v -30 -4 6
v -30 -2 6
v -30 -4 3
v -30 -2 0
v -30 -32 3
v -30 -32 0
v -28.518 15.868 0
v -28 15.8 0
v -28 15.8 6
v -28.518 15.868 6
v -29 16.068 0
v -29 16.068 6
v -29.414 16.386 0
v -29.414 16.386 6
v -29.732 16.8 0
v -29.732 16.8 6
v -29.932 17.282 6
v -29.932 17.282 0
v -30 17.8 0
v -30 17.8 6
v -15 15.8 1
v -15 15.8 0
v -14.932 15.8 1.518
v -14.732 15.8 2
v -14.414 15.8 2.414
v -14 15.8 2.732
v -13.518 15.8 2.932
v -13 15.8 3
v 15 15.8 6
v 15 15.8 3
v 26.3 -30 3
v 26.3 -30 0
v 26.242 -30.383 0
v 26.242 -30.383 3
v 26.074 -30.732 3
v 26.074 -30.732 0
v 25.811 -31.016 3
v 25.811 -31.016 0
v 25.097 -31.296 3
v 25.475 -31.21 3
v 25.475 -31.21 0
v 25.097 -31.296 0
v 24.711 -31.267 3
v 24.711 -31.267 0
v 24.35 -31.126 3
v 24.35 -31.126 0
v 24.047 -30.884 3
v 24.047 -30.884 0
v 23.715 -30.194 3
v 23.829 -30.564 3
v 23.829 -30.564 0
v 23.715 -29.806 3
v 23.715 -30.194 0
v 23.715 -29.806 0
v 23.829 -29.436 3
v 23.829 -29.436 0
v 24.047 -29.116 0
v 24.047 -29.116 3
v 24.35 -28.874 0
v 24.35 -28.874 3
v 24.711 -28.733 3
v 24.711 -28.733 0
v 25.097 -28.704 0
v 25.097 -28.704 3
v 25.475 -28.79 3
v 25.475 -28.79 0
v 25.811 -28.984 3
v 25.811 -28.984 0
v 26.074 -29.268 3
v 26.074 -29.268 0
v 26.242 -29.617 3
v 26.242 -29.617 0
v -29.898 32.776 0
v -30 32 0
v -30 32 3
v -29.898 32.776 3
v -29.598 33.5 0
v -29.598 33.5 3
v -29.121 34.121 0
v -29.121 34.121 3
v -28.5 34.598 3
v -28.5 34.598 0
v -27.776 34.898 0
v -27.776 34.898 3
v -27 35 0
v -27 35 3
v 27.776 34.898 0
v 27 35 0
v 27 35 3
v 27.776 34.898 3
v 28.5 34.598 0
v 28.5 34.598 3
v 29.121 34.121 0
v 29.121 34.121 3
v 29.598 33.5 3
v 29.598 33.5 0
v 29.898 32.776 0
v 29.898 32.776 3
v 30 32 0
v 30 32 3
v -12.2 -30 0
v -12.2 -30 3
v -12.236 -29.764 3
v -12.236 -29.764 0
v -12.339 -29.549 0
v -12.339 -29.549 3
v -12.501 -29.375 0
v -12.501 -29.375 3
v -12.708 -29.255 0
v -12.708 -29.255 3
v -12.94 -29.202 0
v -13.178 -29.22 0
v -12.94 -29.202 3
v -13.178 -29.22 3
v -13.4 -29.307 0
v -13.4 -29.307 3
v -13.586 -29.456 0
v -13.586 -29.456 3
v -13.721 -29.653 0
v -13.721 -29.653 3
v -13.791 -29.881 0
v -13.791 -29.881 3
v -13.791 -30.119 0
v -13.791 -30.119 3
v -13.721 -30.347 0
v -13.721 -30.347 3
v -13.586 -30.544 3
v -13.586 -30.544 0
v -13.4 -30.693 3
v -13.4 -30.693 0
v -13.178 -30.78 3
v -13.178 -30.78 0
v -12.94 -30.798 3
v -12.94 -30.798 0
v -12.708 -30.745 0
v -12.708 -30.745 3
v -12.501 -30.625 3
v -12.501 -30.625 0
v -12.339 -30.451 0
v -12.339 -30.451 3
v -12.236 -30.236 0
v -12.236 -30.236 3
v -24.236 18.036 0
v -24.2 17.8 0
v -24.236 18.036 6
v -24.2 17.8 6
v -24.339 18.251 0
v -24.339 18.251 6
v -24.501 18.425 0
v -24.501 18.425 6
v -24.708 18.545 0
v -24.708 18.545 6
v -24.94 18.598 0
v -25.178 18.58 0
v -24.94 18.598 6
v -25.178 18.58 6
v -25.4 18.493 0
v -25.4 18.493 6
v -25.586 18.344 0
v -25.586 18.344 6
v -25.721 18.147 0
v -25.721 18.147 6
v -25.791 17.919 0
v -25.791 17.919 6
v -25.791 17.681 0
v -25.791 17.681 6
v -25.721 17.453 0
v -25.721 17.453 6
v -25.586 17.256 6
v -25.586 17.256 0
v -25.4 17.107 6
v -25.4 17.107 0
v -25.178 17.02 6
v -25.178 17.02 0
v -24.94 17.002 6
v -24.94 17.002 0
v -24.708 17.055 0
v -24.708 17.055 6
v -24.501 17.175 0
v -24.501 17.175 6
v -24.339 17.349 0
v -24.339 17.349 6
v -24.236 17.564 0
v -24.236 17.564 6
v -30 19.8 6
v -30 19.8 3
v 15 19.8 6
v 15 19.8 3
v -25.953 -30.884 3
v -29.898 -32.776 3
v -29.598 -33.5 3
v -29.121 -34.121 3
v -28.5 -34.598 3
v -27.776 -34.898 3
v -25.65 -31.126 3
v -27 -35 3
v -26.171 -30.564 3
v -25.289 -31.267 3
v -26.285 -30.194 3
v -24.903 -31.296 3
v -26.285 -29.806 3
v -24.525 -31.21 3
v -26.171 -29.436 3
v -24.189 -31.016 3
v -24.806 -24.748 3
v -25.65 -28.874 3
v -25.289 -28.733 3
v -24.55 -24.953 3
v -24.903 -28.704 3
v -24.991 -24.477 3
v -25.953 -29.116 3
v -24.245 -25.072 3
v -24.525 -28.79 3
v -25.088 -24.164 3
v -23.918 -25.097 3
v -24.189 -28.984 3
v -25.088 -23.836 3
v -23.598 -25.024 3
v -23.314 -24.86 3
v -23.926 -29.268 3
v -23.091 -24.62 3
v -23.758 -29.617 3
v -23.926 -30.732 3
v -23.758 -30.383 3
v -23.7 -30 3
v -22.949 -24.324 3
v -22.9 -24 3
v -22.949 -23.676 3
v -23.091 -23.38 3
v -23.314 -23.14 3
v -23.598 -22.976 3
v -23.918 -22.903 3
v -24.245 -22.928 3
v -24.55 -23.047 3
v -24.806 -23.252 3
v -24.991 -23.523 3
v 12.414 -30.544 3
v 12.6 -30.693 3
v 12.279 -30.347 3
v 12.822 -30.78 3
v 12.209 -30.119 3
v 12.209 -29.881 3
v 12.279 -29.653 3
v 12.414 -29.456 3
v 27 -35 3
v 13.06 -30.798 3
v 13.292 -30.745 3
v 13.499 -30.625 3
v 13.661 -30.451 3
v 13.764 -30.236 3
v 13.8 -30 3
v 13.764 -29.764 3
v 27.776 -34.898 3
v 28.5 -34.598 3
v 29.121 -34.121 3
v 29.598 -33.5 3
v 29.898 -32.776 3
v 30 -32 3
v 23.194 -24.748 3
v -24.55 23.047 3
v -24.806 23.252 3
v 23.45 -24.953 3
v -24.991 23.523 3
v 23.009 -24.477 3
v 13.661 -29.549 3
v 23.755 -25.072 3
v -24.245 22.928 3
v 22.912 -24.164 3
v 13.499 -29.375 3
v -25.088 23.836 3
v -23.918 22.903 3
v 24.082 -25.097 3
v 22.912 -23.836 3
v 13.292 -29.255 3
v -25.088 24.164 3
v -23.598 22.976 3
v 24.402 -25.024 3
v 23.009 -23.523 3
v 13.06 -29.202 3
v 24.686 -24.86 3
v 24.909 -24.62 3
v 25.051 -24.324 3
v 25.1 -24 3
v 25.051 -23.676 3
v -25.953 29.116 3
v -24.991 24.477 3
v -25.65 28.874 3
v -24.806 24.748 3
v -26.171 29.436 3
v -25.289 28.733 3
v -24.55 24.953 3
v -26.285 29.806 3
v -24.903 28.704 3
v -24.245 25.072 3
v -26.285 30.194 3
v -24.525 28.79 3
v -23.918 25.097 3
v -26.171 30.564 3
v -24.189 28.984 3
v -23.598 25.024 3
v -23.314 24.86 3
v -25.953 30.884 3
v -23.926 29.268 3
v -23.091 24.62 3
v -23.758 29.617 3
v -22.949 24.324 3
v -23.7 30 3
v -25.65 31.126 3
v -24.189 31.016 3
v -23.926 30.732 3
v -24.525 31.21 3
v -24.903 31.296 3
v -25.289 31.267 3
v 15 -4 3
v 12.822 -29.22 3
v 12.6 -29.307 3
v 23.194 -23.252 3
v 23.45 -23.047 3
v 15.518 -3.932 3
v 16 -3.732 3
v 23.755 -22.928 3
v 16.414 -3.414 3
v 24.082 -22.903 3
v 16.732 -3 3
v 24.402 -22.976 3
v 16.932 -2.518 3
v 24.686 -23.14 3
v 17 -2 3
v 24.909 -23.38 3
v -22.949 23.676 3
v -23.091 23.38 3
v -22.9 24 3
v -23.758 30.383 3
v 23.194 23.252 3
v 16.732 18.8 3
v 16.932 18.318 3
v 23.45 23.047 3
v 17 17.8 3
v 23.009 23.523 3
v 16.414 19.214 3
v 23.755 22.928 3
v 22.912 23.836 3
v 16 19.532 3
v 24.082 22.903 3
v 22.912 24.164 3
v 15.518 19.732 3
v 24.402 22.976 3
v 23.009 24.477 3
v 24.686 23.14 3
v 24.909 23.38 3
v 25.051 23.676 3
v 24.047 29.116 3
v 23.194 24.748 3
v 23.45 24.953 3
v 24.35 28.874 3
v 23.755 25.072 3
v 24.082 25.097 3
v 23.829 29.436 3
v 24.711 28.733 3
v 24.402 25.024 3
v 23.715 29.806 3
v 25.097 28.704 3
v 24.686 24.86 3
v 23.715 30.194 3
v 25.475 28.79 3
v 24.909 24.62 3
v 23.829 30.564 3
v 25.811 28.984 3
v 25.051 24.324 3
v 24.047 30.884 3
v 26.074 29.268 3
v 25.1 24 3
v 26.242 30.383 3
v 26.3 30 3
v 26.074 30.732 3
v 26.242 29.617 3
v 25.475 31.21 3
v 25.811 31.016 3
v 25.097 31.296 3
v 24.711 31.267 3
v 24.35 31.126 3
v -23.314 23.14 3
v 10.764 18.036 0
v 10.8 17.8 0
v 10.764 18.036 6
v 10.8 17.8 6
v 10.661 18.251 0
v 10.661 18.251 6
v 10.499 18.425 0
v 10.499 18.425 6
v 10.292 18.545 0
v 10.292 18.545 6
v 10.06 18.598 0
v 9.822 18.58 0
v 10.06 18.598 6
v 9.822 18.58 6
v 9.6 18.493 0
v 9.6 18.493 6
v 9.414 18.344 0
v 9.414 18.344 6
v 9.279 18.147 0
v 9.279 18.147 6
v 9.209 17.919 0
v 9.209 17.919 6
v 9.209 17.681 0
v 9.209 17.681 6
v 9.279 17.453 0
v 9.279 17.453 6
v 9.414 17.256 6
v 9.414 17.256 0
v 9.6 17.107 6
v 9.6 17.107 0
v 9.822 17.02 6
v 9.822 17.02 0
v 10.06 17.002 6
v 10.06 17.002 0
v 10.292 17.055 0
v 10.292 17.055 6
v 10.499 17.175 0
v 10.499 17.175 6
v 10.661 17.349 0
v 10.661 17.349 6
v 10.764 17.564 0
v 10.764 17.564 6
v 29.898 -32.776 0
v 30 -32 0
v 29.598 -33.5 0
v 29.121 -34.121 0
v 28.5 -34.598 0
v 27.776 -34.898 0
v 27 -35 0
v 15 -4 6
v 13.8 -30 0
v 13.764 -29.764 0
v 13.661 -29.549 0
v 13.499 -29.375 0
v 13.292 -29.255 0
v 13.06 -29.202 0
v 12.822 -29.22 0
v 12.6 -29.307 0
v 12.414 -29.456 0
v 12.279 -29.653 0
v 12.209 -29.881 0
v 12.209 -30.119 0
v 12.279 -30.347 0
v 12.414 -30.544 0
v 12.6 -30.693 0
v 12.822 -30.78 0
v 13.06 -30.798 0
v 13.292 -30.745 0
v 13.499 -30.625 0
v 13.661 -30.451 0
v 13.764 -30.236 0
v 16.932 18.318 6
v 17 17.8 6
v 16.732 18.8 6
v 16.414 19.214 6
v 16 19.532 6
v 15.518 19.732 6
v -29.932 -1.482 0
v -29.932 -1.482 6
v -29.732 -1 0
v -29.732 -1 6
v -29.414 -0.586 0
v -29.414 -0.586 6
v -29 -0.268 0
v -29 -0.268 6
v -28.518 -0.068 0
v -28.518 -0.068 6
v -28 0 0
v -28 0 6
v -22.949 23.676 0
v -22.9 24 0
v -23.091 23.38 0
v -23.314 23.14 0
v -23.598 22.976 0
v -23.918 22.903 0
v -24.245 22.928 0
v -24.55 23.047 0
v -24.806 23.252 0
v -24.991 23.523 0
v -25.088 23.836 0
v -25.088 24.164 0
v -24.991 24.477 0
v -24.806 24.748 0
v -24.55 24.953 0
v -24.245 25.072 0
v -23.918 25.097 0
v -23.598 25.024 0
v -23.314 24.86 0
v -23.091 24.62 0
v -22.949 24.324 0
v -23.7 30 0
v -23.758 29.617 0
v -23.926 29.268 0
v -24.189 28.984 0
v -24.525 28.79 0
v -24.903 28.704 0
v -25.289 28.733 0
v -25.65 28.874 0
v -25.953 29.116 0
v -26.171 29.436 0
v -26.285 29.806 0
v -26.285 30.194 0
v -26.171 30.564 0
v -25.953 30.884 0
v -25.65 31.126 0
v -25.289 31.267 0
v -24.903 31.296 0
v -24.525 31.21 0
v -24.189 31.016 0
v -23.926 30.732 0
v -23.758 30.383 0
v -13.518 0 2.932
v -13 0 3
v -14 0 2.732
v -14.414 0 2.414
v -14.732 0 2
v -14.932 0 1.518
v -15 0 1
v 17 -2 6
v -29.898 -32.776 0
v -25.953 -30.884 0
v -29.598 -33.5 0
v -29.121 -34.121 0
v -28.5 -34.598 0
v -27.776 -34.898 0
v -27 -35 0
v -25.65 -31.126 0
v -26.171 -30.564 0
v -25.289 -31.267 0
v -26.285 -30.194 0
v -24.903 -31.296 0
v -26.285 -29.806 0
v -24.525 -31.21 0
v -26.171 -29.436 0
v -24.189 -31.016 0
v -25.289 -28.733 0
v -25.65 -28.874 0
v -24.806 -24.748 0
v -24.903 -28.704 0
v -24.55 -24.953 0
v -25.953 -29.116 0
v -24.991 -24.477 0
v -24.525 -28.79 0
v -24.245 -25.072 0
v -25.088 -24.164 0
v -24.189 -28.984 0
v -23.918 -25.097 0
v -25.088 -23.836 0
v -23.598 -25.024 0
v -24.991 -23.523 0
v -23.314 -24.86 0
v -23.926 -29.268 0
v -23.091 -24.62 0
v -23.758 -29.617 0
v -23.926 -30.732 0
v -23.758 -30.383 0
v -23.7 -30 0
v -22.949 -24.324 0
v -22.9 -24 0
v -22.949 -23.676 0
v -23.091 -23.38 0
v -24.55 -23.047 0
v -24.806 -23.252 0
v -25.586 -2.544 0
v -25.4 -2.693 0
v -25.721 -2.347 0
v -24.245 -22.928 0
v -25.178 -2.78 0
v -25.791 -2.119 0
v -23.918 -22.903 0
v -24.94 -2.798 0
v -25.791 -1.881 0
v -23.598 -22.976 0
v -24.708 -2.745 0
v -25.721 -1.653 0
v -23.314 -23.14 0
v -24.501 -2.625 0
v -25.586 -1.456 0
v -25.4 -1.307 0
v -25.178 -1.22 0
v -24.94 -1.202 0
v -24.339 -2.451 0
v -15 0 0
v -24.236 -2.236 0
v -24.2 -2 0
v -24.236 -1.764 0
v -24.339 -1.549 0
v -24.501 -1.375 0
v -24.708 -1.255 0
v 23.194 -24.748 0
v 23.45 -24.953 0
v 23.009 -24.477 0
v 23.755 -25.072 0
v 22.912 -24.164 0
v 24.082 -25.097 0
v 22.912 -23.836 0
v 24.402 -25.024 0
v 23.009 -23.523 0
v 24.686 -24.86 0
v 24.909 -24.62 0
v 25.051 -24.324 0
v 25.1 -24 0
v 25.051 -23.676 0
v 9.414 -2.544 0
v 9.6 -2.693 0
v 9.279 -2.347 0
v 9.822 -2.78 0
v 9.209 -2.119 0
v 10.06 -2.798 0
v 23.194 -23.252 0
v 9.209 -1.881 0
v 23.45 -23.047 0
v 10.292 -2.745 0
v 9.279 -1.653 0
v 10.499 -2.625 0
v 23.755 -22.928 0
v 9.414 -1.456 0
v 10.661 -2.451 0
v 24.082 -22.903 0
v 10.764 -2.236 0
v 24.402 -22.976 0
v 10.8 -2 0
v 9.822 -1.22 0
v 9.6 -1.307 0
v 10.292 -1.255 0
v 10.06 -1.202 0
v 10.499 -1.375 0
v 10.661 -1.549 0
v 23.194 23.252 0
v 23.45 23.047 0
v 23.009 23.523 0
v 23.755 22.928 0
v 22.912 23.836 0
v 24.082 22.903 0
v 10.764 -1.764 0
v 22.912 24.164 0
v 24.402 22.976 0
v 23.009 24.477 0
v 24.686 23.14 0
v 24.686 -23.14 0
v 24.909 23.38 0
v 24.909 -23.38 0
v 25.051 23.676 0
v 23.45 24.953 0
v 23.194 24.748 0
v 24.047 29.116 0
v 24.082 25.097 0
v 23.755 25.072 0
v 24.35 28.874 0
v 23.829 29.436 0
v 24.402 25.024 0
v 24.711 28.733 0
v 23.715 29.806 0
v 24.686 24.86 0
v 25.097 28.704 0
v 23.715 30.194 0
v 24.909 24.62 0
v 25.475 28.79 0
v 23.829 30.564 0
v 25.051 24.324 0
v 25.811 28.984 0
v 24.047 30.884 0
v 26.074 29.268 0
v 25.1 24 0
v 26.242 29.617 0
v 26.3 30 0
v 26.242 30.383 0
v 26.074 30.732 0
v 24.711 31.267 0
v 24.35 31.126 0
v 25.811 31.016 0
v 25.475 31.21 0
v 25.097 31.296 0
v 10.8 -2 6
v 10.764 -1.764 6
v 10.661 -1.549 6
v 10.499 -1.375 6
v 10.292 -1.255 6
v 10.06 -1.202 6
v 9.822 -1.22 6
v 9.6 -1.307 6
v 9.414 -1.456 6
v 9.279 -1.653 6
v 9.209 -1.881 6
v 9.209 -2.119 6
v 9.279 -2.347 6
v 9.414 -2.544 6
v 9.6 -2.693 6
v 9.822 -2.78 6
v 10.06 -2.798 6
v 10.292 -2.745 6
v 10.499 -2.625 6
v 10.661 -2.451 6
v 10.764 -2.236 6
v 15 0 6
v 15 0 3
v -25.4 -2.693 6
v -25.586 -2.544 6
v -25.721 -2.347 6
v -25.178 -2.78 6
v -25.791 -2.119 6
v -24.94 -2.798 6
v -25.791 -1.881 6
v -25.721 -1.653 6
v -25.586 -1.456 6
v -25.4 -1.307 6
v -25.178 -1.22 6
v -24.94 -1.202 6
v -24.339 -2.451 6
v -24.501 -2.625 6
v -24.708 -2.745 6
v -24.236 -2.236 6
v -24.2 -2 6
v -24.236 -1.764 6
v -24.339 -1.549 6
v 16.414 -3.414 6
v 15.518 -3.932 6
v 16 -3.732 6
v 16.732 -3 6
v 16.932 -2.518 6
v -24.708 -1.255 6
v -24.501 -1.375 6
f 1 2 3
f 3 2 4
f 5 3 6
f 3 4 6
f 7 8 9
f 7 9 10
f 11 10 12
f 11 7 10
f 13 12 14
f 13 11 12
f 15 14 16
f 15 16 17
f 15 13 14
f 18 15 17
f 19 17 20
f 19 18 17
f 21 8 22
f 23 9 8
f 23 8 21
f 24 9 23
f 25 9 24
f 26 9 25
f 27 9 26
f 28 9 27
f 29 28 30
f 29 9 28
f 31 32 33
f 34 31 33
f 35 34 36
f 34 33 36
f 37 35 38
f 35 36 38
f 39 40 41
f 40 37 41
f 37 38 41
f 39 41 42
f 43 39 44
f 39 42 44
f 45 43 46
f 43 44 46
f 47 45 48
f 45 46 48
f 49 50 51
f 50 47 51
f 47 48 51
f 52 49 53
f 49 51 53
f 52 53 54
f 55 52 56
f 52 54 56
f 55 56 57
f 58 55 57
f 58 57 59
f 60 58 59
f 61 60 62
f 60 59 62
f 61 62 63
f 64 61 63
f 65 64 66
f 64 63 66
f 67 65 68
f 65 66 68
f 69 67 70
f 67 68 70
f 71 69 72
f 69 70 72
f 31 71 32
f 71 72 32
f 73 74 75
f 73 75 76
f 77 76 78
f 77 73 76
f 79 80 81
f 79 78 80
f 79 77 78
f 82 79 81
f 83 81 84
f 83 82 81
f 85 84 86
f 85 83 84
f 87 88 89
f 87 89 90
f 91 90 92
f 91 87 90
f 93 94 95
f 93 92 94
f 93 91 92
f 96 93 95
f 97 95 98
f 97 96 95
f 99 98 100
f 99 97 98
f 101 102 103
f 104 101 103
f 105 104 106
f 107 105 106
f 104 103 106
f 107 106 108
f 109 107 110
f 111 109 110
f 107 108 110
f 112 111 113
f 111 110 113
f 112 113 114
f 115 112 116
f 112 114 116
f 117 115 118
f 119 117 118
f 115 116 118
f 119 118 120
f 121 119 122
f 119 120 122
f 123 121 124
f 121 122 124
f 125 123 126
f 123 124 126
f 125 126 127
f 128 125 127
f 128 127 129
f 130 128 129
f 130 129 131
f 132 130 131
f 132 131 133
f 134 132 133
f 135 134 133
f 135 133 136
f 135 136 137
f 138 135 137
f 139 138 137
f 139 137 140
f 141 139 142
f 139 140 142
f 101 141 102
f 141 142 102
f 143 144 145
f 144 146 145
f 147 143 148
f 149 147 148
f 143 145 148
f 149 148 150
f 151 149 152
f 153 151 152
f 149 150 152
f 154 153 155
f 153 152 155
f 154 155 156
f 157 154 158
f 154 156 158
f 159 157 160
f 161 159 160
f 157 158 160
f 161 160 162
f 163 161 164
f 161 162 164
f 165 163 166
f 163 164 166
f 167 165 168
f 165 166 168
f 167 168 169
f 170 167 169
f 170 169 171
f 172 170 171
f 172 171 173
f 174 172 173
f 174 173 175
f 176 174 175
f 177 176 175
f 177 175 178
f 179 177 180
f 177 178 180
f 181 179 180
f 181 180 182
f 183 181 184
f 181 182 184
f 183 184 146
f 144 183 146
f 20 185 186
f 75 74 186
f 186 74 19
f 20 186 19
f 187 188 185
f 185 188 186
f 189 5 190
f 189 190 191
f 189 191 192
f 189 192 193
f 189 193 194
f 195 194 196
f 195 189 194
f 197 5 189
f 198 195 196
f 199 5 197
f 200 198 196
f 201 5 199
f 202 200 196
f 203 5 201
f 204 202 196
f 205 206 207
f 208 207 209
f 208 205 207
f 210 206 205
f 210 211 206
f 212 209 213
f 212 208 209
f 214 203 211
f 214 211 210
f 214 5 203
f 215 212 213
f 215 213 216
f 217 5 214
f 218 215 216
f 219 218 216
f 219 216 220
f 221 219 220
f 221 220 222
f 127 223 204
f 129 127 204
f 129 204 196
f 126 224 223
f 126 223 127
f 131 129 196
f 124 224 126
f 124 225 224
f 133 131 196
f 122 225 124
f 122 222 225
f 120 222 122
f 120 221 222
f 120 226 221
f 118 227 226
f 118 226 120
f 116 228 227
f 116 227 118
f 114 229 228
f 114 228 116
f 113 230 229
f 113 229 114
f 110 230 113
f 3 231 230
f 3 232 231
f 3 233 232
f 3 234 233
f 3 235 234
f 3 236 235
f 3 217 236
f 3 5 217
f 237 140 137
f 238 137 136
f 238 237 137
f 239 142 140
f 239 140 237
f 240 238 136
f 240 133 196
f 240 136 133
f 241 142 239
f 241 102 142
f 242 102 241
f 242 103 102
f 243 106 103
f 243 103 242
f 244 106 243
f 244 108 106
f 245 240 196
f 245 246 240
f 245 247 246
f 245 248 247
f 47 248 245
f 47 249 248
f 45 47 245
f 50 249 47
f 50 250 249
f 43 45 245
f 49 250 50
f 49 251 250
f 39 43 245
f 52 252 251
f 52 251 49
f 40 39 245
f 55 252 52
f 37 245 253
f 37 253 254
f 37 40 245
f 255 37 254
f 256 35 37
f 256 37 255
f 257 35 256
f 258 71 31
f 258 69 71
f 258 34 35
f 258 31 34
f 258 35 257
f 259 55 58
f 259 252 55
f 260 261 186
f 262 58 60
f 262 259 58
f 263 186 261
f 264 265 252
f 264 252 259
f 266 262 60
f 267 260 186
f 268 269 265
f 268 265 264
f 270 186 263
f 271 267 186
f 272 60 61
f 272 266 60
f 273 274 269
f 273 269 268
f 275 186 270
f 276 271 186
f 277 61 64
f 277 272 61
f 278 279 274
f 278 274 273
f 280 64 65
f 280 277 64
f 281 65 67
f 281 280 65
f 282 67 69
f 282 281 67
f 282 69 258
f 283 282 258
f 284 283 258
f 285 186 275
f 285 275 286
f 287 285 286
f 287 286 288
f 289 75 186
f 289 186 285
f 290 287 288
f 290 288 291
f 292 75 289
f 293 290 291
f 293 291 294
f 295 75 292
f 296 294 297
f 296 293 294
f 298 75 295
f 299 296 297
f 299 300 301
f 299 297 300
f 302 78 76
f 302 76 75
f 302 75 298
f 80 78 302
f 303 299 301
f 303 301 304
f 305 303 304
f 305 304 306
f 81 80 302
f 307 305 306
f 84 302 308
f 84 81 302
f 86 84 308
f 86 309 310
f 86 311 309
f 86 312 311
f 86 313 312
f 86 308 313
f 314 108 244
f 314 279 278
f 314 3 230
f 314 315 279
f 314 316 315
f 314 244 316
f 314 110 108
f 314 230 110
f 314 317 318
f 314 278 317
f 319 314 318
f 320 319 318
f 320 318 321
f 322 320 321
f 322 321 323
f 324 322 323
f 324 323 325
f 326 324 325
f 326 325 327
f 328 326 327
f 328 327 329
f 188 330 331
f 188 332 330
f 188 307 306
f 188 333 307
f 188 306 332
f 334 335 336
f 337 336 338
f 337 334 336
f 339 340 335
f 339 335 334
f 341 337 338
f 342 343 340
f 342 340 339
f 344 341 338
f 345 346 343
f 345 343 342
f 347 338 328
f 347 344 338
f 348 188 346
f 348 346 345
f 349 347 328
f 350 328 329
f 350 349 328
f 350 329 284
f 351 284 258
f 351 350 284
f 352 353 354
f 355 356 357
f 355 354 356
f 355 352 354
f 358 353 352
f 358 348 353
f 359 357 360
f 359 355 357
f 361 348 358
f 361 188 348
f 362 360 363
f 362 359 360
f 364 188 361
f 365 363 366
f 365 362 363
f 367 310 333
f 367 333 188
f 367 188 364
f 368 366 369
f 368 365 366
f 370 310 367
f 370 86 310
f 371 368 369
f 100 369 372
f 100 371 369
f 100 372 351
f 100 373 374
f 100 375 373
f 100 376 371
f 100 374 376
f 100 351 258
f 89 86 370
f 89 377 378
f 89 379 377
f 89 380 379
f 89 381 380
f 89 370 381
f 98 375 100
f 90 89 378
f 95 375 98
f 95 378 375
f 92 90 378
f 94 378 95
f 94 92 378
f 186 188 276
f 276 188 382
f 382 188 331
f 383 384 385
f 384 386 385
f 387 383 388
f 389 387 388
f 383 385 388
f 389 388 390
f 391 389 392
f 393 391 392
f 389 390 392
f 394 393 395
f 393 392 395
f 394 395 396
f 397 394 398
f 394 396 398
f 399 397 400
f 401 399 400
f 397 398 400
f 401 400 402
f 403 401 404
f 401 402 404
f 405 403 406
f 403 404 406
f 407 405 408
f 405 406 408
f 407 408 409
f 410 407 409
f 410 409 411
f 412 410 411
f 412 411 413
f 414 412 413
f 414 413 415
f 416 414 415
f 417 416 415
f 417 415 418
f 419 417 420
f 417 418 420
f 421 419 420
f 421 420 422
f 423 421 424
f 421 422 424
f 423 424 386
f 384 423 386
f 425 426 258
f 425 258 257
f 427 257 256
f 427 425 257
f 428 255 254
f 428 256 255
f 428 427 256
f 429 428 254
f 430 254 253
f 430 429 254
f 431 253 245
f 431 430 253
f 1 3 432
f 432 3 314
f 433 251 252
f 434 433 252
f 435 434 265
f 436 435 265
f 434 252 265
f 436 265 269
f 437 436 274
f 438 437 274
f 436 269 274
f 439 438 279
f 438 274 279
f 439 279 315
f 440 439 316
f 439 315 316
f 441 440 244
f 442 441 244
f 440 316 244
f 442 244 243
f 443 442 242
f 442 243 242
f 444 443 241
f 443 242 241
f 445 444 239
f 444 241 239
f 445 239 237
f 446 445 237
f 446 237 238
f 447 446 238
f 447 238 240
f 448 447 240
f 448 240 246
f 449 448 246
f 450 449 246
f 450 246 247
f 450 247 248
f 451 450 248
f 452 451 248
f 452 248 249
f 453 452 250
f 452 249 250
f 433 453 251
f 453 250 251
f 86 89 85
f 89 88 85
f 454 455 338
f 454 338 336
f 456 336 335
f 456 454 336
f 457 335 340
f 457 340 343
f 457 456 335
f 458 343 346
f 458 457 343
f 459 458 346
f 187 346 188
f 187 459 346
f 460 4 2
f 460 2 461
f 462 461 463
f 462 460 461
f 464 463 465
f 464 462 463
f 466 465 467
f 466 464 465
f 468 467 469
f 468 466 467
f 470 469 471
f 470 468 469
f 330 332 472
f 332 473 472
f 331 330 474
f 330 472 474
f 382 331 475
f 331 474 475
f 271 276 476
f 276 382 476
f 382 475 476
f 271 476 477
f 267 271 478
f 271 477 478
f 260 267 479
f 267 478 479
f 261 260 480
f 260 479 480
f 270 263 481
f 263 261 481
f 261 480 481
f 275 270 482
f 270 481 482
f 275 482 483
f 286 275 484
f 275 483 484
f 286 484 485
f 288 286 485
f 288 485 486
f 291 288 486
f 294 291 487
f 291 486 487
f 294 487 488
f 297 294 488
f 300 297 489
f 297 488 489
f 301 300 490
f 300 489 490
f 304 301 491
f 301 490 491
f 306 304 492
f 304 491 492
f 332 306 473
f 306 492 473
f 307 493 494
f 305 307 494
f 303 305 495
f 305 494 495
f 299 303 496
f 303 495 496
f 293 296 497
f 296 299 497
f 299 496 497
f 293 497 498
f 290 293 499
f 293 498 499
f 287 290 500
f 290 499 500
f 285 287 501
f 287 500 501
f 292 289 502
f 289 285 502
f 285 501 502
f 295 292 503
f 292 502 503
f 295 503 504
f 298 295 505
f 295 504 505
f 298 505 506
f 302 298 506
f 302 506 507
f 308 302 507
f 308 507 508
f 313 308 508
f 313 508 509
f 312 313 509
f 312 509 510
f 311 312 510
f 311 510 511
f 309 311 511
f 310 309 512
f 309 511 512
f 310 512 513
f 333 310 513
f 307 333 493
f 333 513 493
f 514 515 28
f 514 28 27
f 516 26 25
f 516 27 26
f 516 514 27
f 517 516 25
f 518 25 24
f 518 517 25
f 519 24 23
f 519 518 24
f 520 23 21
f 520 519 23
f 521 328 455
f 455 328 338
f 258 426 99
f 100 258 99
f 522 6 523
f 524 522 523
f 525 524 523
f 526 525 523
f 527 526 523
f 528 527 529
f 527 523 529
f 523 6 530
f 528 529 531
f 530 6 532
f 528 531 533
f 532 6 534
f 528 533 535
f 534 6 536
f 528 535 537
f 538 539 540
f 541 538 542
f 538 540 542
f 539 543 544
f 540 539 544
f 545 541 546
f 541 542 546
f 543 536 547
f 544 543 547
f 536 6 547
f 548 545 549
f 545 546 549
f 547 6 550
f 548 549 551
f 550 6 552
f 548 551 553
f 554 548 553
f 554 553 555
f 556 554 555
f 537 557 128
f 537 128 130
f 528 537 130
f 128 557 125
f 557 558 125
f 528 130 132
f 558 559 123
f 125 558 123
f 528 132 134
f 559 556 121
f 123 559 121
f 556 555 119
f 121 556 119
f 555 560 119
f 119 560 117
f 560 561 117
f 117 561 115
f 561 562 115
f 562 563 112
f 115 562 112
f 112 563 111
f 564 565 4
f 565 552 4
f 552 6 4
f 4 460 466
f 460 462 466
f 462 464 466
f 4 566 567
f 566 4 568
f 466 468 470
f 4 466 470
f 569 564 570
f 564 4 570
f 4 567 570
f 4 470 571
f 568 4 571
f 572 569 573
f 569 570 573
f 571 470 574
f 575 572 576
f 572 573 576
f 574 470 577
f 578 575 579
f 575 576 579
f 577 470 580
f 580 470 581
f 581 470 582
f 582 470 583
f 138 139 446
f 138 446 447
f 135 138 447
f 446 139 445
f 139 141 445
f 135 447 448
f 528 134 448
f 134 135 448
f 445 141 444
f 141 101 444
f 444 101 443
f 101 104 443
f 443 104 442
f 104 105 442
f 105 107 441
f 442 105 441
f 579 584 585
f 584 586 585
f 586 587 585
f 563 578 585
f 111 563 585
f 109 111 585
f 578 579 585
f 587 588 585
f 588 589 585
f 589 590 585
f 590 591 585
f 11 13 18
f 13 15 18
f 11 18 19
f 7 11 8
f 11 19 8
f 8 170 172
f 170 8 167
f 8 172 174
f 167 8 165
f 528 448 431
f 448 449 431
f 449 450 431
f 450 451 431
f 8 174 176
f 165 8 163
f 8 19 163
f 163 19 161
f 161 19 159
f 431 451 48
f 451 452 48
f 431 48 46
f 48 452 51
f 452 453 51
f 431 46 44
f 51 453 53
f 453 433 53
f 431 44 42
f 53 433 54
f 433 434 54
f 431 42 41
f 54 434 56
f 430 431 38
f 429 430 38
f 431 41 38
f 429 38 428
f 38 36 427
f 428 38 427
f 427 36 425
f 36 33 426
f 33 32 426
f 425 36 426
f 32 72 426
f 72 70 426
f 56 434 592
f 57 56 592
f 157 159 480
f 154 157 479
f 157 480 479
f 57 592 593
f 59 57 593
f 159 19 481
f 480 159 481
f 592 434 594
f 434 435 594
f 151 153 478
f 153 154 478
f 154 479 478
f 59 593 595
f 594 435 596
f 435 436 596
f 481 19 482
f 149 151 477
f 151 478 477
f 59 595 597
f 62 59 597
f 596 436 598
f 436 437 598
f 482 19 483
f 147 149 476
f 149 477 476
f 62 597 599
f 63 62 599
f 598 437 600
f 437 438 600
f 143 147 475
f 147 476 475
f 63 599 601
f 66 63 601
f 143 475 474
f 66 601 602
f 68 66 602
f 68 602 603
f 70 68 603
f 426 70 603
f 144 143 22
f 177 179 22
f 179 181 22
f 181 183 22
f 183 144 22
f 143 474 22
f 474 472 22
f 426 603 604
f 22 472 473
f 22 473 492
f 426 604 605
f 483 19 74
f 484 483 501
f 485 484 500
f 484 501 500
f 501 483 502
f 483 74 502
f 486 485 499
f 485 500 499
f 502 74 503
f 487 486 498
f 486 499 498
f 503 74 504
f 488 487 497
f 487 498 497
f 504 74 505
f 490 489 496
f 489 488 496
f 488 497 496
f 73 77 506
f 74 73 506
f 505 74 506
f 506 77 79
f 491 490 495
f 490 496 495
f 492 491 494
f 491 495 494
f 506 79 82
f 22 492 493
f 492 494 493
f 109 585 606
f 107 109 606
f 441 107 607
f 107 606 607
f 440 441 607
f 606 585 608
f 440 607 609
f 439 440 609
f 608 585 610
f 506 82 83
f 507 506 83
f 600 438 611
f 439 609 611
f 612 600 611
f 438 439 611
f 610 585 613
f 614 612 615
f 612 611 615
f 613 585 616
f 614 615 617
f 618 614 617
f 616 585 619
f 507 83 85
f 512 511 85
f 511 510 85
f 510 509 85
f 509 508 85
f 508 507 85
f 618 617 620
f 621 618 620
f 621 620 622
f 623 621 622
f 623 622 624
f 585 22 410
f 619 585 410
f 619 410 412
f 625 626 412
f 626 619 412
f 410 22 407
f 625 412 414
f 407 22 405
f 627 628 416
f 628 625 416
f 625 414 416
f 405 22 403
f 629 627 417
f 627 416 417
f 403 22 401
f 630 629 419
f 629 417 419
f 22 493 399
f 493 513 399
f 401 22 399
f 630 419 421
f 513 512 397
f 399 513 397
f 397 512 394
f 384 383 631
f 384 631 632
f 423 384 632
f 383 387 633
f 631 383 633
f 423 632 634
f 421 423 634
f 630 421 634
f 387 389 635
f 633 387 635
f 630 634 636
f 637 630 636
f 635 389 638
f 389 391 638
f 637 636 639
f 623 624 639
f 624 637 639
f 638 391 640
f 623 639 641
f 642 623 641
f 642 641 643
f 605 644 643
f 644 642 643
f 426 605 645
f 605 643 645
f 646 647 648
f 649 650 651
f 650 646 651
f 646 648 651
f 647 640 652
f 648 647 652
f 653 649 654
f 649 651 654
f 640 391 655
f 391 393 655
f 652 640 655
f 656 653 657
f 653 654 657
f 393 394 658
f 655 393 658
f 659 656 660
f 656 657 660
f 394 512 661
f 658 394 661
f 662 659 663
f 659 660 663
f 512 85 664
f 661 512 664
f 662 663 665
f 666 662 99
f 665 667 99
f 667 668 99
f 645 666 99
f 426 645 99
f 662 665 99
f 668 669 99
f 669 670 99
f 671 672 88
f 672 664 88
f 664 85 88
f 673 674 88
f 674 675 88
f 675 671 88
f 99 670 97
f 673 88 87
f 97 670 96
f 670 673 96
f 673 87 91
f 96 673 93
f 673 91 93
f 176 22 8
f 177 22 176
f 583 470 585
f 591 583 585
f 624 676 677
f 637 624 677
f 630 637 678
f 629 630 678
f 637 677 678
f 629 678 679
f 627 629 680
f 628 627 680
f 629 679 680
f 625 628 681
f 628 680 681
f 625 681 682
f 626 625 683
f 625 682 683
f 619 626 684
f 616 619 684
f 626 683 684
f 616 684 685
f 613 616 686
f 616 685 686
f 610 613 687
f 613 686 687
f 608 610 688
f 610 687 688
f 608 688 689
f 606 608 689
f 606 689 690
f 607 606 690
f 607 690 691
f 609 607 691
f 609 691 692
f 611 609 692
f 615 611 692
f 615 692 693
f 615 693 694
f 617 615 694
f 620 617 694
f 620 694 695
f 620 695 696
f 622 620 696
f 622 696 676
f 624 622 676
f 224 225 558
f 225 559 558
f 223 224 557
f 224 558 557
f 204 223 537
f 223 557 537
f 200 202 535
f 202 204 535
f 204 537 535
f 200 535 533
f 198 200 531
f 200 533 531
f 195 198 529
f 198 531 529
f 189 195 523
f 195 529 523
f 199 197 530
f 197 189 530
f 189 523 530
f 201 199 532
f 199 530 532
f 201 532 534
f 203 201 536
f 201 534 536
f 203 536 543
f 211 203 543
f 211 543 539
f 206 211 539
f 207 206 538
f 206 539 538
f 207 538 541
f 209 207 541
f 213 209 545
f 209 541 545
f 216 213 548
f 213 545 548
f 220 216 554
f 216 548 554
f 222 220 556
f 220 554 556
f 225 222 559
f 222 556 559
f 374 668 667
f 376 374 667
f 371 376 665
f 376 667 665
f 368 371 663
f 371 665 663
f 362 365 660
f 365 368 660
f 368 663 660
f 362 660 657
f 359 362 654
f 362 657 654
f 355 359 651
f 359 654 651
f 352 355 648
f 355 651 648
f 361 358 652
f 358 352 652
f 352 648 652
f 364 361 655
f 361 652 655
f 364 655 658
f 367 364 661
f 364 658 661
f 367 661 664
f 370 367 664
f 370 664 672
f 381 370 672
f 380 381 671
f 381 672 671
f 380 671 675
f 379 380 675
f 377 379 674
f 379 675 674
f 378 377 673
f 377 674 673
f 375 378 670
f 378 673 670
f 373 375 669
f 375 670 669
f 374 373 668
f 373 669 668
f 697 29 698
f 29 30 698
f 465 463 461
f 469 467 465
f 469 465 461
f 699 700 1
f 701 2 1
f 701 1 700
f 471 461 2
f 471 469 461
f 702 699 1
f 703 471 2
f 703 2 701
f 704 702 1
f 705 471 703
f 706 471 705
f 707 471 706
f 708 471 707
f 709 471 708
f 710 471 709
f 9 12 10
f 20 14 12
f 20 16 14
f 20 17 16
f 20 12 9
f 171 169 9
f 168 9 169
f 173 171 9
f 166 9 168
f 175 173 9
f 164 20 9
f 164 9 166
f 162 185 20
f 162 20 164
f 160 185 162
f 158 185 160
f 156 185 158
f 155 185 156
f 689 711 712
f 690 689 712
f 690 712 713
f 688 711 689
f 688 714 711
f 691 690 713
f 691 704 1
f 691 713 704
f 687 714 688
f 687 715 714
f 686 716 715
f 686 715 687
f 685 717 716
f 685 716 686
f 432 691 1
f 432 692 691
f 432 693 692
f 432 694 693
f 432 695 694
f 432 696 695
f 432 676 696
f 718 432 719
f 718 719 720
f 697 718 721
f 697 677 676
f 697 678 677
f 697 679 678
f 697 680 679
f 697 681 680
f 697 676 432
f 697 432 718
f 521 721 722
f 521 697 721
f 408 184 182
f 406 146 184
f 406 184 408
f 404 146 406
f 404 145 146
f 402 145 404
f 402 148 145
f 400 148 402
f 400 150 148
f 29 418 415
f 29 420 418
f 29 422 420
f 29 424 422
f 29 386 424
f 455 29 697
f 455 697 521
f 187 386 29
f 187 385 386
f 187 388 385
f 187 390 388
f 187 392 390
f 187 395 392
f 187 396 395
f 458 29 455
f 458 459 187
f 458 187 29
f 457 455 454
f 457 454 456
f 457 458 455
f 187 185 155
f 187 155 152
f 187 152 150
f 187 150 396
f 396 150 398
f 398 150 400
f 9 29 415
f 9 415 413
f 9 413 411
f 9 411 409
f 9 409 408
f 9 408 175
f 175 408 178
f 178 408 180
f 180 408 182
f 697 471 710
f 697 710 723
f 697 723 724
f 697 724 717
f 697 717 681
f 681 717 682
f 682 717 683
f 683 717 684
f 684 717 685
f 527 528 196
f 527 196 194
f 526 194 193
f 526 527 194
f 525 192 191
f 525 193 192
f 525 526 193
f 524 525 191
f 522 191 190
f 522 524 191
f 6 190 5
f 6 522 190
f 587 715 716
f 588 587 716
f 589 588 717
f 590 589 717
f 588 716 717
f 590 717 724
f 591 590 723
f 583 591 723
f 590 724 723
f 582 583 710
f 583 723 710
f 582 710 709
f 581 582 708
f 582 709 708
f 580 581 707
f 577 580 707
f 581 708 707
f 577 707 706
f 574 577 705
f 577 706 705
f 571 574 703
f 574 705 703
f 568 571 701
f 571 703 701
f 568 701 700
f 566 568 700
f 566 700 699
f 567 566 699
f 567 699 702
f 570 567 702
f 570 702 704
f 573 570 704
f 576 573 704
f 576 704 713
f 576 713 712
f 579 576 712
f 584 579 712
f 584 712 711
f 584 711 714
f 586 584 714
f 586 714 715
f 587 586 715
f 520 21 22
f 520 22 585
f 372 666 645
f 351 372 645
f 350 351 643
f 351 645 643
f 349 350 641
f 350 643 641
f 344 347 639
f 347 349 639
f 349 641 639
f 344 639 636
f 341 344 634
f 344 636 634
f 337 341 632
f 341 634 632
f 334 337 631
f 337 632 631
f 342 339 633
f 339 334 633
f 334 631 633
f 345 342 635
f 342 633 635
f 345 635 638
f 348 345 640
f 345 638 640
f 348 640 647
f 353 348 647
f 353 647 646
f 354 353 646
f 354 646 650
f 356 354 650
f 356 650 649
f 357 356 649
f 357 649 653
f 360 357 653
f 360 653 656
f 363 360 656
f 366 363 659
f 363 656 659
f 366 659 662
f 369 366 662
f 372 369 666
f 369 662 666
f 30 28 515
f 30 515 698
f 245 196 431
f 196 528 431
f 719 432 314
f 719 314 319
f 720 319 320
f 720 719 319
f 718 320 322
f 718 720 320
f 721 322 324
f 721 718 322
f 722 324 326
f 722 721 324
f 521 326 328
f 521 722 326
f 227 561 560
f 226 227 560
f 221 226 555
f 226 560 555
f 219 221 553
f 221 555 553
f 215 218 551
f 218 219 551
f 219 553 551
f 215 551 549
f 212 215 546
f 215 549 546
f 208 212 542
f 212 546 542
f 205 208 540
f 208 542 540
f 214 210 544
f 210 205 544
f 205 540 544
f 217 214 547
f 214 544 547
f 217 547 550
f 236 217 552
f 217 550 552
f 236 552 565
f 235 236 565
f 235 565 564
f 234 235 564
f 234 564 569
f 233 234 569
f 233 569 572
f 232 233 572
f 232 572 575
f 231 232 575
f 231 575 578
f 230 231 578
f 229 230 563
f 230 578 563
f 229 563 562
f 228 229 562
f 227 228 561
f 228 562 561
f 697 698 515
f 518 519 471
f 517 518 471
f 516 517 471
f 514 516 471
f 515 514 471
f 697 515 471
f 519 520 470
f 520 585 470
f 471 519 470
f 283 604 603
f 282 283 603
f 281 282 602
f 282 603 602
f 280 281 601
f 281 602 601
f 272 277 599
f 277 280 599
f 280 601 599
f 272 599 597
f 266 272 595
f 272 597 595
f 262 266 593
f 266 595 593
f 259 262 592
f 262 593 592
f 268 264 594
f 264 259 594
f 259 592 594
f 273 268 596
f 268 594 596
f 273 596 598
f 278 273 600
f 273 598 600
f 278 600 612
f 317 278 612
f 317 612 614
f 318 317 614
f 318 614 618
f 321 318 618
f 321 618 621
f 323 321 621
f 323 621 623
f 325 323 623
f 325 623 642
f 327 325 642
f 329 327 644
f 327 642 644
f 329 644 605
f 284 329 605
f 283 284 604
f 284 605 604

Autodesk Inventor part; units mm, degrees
ref_plane "YZ Plane" through (0, 0, 0) normal (1, 0, 0) x (0, 1, 0)
ref_plane "XZ Plane" through (0, 0, 0) normal (0, 1, 0) x (-1, 0, 0)
ref_plane "XY Plane" through (0, 0, 0) normal (0, 0, 1) x (1, 0, 0)
sketch "スケッチ4" plane through (0, 0, 0) normal (0, 0, 1) x (1, 0, 0)
  line L0 (-27, -35) -> (27, -35)
  line L1 (30, -32) -> (30, 32)
  line L2 (27, 35) -> (-27, 35)
  line L3 (-30, 32) -> (-30, -32)
  line L4 (-30, -35) -> (30, 35) construction
  line L5 (30, -35) -> (-30, 35) construction
  line L6 (-25, -30) -> (25, -30) construction
  line L7 (25, -30) -> (25, 30) construction
  line L8 (25, 30) -> (-25, 30) construction
  line L9 (-25, 30) -> (-25, -30) construction
  line L10 (-25, -30) -> (25, 30) construction
  line L11 (25, -30) -> (-25, 30) construction
  circle A0 centre (-25, 30) radius 1.3
  circle A1 centre (25, 30) radius 1.3
  circle A2 centre (25, -30) radius 1.3
  circle A3 centre (-25, -30) radius 1.3
  circle A4 centre (-25, 30) radius 2.6
  circle A5 centre (25, 30) radius 2.6
  circle A6 centre (25, -30) radius 2.6
  circle A7 centre (-25, -30) radius 2.6
  arc A8 (27, -35) -> (30, -32) centre (27, -32) ccw
  arc A9 (-30, -32) -> (-27, -35) centre (-27, -32) ccw
  arc A10 (-27, 35) -> (-30, 32) centre (-27, 32) ccw
  arc A11 (30, 32) -> (27, 35) centre (27, 32) ccw
  line L12 (24, 24) -> (-24, 24) construction
  line L13 (-24, 24) -> (-24, -24) construction
  line L14 (-24, -24) -> (24, -24) construction
  line L15 (24, -24) -> (24, 24) construction
  line L16 (24, 24) -> (-24, -24) construction
  line L17 (-24, 24) -> (24, -24) construction
  circle A12 centre (-24, -24) radius 1.1
  circle A13 centre (-24, 24) radius 1.1
  circle A14 centre (24, -24) radius 1.1
  circle A15 centre (24, 24) radius 1.1
  point P0 (0, 0)
  dimension "d18" = 70
  dimension "d19" = 60
  dimension "d20" = 50
  dimension "d21" = 60
  dimension "d22" = 2.6
  dimension "d30" = 5.2
  dimension "d33" = 3
  dimension "d40" = 48
  dimension "d41" = 48
  dimension "d42" = 2.2
extrude "押し出し4" add sketch "スケッチ4" along normal blind 3 contours A9 L3 A10 L2 A11 L1 A8 L0 | A4 | A5 | A6 | A7
sketch "スケッチ8" plane through (0, 0, 3) normal (0, 0, 1) x (1, 0, 0)
  line L0 (15, 0) -> (-30, 0)
  line L1 (-30, 0) -> (-30, 15.8)
  line L2 (-30, 15.8) -> (15, 15.8)
  line L3 (15, 15.8) -> (15, 0)
  line L4 (-42, 0) -> (42, 0) projected
  line L5 (-30, 32) -> (-30, -32) projected
  line L6 (-30, 32) -> (-30, -32) projected
  line L7 (-30, -4) -> (17, -4)
  line L8 (17, -4) -> (17, 19.8)
  line L9 (17, 19.8) -> (-30, 19.8)
  line L10 (-15, 15.8) -> (-15, 0)
  circle A0 centre (0, 23.9) radius 2
  circle A1 centre (0, -8.1) radius 2
  line L11 (0, -49) -> (0, 49) projected
  line L12 (15, 7.9) -> (-15, 7.9) construction
  circle A2 centre (-13, -30) radius 0.8
  circle A3 centre (13, -30) radius 0.8
  line L13 (-27, -35) -> (27, -35) projected
  point P0 (0, 0)
  point P1 (-30, 19.8)
  point P2 (-30, -4)
  dimension "d48" = 15.8
  dimension "d49" = 45
  dimension "d50" = 2
  dimension "d51" = 4
  dimension "d52" = 4
  dimension "d55" = 15
  dimension "d58" = 4
  dimension "d59" = 16
  dimension "d61" = 26
  dimension "d62" = 1.6
  dimension "d63" = 5
extrude "押し出し9" add sketch "スケッチ8" along normal blind 3 contours L0 L11 L7 L5 | L0 L4 L8 L7 L11 | L2 L5 L9 L11 | L3 L2 L11 L9 L8 L4
extrude "押し出し10" cut sketch "スケッチ8" against normal up to surface (3 mm away) contours L0 L1 L2 L10 | A2 | A3
fillet "フィレット2" radius 2 5 edges at (-30, 15.8, 3) (-30, 0, 3) (-15, 7.9, 3) (17, 19.8, 4.5) (17, -4, 4.5)
sketch "スケッチ10" plane through (0, 0, 6) normal (0, 0, 1) x (1, 0, 0)
  circle A0 centre (-25, 17.8) radius 0.8
  circle A1 centre (10, 17.8) radius 0.8
  line L0 (-25, 17.8) -> (10, 17.8) construction
  line L1 (10, 17.8) -> (10, -2) construction
  line L2 (10, -2) -> (-25, -2) construction
  line L3 (-25, -2) -> (-25, 17.8) construction
  circle A2 centre (-25, -2) radius 0.8
  circle A3 centre (10, -2) radius 0.8
  arc A4 (-28, 0) -> (-30, -2) centre (-28, -2) ccw projected
  line L4 (-30, -2) -> (-30, -4) projected
  line L5 (-30, -4) -> (15, -4) projected
  line L6 (17, -2) -> (17, 17.8) projected
  line L7 (15, 19.8) -> (-30, 19.8) projected
  line L8 (-30, 19.8) -> (-30, 17.8) projected
  arc A5 (-30, 17.8) -> (-28, 15.8) centre (-28, 17.8) ccw projected
  line L9 (-28, 15.8) -> (15, 15.8) projected
  line L10 (15, 15.8) -> (15, 0) projected
  line L11 (15, 0) -> (-28, 0) projected
  circle A6 centre (-25, 17.8) radius 2 construction
  circle A7 centre (10, -2) radius 2 construction
  arc A8 (15, -4) -> (17, -2) centre (15, -2) ccw projected
  arc A9 (17, 17.8) -> (15, 19.8) centre (15, 17.8) ccw projected
  point P0 (0, 0)
  point P1 (-30, 18.8)
  dimension "d64" = 1.6
  dimension "d65" = 5
  dimension "d66" = 5
extrude "押し出し11" cut sketch "スケッチ10" against normal up to surface (6 mm away) contours A0 | A1 | A2 | A3
equation "\"d51\" = d52"
properties part number "ThirdPlate"
